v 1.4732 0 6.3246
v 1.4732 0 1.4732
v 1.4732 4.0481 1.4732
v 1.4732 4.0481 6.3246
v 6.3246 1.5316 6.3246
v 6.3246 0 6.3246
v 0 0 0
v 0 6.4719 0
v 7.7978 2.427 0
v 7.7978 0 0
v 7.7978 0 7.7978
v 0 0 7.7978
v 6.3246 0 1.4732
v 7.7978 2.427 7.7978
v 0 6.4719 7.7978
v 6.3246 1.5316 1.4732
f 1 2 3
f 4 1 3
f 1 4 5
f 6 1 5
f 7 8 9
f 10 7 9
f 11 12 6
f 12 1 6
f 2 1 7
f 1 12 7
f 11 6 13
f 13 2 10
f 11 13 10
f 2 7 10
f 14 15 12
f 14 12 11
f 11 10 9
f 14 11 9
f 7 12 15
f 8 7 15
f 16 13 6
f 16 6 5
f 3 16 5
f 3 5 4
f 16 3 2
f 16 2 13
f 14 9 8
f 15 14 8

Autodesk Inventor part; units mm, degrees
ref_plane "YZ Plane" through (0, 0, 0) normal (1, 0, 0) x (0, 1, 0)
ref_plane "XZ Plane" through (0, 0, 0) normal (0, 1, 0) x (-1, 0, 0)
ref_plane "XY Plane" through (0, 0, 0) normal (0, 0, 1) x (1, 0, 0)
sketch "Sketch1" plane through (0, 0, 0) normal (0, 0, 1) x (1, 0, 0)
  line L0 (0, 0) -> (0, 6.4719)
  line L1 (0, 0) -> (7.7978, 0)
  line L2 (7.7978, 0) -> (7.7978, 2.427)
  line L3 (7.7978, 2.427) -> (0, 6.4719)
  dimension "d0" = 6.4719
  dimension "d1" = 7.7978
  dimension "d5" = 2.427
extrude "Extrusion1" add sketch "Sketch1" along normal blind 7.7978
shell "Shell1" thickness 1.4732 removed faces 1 at (5.1985, 0, 2.5993)
properties part number "Transparent Grey Peice" material "ABS Plastic"
